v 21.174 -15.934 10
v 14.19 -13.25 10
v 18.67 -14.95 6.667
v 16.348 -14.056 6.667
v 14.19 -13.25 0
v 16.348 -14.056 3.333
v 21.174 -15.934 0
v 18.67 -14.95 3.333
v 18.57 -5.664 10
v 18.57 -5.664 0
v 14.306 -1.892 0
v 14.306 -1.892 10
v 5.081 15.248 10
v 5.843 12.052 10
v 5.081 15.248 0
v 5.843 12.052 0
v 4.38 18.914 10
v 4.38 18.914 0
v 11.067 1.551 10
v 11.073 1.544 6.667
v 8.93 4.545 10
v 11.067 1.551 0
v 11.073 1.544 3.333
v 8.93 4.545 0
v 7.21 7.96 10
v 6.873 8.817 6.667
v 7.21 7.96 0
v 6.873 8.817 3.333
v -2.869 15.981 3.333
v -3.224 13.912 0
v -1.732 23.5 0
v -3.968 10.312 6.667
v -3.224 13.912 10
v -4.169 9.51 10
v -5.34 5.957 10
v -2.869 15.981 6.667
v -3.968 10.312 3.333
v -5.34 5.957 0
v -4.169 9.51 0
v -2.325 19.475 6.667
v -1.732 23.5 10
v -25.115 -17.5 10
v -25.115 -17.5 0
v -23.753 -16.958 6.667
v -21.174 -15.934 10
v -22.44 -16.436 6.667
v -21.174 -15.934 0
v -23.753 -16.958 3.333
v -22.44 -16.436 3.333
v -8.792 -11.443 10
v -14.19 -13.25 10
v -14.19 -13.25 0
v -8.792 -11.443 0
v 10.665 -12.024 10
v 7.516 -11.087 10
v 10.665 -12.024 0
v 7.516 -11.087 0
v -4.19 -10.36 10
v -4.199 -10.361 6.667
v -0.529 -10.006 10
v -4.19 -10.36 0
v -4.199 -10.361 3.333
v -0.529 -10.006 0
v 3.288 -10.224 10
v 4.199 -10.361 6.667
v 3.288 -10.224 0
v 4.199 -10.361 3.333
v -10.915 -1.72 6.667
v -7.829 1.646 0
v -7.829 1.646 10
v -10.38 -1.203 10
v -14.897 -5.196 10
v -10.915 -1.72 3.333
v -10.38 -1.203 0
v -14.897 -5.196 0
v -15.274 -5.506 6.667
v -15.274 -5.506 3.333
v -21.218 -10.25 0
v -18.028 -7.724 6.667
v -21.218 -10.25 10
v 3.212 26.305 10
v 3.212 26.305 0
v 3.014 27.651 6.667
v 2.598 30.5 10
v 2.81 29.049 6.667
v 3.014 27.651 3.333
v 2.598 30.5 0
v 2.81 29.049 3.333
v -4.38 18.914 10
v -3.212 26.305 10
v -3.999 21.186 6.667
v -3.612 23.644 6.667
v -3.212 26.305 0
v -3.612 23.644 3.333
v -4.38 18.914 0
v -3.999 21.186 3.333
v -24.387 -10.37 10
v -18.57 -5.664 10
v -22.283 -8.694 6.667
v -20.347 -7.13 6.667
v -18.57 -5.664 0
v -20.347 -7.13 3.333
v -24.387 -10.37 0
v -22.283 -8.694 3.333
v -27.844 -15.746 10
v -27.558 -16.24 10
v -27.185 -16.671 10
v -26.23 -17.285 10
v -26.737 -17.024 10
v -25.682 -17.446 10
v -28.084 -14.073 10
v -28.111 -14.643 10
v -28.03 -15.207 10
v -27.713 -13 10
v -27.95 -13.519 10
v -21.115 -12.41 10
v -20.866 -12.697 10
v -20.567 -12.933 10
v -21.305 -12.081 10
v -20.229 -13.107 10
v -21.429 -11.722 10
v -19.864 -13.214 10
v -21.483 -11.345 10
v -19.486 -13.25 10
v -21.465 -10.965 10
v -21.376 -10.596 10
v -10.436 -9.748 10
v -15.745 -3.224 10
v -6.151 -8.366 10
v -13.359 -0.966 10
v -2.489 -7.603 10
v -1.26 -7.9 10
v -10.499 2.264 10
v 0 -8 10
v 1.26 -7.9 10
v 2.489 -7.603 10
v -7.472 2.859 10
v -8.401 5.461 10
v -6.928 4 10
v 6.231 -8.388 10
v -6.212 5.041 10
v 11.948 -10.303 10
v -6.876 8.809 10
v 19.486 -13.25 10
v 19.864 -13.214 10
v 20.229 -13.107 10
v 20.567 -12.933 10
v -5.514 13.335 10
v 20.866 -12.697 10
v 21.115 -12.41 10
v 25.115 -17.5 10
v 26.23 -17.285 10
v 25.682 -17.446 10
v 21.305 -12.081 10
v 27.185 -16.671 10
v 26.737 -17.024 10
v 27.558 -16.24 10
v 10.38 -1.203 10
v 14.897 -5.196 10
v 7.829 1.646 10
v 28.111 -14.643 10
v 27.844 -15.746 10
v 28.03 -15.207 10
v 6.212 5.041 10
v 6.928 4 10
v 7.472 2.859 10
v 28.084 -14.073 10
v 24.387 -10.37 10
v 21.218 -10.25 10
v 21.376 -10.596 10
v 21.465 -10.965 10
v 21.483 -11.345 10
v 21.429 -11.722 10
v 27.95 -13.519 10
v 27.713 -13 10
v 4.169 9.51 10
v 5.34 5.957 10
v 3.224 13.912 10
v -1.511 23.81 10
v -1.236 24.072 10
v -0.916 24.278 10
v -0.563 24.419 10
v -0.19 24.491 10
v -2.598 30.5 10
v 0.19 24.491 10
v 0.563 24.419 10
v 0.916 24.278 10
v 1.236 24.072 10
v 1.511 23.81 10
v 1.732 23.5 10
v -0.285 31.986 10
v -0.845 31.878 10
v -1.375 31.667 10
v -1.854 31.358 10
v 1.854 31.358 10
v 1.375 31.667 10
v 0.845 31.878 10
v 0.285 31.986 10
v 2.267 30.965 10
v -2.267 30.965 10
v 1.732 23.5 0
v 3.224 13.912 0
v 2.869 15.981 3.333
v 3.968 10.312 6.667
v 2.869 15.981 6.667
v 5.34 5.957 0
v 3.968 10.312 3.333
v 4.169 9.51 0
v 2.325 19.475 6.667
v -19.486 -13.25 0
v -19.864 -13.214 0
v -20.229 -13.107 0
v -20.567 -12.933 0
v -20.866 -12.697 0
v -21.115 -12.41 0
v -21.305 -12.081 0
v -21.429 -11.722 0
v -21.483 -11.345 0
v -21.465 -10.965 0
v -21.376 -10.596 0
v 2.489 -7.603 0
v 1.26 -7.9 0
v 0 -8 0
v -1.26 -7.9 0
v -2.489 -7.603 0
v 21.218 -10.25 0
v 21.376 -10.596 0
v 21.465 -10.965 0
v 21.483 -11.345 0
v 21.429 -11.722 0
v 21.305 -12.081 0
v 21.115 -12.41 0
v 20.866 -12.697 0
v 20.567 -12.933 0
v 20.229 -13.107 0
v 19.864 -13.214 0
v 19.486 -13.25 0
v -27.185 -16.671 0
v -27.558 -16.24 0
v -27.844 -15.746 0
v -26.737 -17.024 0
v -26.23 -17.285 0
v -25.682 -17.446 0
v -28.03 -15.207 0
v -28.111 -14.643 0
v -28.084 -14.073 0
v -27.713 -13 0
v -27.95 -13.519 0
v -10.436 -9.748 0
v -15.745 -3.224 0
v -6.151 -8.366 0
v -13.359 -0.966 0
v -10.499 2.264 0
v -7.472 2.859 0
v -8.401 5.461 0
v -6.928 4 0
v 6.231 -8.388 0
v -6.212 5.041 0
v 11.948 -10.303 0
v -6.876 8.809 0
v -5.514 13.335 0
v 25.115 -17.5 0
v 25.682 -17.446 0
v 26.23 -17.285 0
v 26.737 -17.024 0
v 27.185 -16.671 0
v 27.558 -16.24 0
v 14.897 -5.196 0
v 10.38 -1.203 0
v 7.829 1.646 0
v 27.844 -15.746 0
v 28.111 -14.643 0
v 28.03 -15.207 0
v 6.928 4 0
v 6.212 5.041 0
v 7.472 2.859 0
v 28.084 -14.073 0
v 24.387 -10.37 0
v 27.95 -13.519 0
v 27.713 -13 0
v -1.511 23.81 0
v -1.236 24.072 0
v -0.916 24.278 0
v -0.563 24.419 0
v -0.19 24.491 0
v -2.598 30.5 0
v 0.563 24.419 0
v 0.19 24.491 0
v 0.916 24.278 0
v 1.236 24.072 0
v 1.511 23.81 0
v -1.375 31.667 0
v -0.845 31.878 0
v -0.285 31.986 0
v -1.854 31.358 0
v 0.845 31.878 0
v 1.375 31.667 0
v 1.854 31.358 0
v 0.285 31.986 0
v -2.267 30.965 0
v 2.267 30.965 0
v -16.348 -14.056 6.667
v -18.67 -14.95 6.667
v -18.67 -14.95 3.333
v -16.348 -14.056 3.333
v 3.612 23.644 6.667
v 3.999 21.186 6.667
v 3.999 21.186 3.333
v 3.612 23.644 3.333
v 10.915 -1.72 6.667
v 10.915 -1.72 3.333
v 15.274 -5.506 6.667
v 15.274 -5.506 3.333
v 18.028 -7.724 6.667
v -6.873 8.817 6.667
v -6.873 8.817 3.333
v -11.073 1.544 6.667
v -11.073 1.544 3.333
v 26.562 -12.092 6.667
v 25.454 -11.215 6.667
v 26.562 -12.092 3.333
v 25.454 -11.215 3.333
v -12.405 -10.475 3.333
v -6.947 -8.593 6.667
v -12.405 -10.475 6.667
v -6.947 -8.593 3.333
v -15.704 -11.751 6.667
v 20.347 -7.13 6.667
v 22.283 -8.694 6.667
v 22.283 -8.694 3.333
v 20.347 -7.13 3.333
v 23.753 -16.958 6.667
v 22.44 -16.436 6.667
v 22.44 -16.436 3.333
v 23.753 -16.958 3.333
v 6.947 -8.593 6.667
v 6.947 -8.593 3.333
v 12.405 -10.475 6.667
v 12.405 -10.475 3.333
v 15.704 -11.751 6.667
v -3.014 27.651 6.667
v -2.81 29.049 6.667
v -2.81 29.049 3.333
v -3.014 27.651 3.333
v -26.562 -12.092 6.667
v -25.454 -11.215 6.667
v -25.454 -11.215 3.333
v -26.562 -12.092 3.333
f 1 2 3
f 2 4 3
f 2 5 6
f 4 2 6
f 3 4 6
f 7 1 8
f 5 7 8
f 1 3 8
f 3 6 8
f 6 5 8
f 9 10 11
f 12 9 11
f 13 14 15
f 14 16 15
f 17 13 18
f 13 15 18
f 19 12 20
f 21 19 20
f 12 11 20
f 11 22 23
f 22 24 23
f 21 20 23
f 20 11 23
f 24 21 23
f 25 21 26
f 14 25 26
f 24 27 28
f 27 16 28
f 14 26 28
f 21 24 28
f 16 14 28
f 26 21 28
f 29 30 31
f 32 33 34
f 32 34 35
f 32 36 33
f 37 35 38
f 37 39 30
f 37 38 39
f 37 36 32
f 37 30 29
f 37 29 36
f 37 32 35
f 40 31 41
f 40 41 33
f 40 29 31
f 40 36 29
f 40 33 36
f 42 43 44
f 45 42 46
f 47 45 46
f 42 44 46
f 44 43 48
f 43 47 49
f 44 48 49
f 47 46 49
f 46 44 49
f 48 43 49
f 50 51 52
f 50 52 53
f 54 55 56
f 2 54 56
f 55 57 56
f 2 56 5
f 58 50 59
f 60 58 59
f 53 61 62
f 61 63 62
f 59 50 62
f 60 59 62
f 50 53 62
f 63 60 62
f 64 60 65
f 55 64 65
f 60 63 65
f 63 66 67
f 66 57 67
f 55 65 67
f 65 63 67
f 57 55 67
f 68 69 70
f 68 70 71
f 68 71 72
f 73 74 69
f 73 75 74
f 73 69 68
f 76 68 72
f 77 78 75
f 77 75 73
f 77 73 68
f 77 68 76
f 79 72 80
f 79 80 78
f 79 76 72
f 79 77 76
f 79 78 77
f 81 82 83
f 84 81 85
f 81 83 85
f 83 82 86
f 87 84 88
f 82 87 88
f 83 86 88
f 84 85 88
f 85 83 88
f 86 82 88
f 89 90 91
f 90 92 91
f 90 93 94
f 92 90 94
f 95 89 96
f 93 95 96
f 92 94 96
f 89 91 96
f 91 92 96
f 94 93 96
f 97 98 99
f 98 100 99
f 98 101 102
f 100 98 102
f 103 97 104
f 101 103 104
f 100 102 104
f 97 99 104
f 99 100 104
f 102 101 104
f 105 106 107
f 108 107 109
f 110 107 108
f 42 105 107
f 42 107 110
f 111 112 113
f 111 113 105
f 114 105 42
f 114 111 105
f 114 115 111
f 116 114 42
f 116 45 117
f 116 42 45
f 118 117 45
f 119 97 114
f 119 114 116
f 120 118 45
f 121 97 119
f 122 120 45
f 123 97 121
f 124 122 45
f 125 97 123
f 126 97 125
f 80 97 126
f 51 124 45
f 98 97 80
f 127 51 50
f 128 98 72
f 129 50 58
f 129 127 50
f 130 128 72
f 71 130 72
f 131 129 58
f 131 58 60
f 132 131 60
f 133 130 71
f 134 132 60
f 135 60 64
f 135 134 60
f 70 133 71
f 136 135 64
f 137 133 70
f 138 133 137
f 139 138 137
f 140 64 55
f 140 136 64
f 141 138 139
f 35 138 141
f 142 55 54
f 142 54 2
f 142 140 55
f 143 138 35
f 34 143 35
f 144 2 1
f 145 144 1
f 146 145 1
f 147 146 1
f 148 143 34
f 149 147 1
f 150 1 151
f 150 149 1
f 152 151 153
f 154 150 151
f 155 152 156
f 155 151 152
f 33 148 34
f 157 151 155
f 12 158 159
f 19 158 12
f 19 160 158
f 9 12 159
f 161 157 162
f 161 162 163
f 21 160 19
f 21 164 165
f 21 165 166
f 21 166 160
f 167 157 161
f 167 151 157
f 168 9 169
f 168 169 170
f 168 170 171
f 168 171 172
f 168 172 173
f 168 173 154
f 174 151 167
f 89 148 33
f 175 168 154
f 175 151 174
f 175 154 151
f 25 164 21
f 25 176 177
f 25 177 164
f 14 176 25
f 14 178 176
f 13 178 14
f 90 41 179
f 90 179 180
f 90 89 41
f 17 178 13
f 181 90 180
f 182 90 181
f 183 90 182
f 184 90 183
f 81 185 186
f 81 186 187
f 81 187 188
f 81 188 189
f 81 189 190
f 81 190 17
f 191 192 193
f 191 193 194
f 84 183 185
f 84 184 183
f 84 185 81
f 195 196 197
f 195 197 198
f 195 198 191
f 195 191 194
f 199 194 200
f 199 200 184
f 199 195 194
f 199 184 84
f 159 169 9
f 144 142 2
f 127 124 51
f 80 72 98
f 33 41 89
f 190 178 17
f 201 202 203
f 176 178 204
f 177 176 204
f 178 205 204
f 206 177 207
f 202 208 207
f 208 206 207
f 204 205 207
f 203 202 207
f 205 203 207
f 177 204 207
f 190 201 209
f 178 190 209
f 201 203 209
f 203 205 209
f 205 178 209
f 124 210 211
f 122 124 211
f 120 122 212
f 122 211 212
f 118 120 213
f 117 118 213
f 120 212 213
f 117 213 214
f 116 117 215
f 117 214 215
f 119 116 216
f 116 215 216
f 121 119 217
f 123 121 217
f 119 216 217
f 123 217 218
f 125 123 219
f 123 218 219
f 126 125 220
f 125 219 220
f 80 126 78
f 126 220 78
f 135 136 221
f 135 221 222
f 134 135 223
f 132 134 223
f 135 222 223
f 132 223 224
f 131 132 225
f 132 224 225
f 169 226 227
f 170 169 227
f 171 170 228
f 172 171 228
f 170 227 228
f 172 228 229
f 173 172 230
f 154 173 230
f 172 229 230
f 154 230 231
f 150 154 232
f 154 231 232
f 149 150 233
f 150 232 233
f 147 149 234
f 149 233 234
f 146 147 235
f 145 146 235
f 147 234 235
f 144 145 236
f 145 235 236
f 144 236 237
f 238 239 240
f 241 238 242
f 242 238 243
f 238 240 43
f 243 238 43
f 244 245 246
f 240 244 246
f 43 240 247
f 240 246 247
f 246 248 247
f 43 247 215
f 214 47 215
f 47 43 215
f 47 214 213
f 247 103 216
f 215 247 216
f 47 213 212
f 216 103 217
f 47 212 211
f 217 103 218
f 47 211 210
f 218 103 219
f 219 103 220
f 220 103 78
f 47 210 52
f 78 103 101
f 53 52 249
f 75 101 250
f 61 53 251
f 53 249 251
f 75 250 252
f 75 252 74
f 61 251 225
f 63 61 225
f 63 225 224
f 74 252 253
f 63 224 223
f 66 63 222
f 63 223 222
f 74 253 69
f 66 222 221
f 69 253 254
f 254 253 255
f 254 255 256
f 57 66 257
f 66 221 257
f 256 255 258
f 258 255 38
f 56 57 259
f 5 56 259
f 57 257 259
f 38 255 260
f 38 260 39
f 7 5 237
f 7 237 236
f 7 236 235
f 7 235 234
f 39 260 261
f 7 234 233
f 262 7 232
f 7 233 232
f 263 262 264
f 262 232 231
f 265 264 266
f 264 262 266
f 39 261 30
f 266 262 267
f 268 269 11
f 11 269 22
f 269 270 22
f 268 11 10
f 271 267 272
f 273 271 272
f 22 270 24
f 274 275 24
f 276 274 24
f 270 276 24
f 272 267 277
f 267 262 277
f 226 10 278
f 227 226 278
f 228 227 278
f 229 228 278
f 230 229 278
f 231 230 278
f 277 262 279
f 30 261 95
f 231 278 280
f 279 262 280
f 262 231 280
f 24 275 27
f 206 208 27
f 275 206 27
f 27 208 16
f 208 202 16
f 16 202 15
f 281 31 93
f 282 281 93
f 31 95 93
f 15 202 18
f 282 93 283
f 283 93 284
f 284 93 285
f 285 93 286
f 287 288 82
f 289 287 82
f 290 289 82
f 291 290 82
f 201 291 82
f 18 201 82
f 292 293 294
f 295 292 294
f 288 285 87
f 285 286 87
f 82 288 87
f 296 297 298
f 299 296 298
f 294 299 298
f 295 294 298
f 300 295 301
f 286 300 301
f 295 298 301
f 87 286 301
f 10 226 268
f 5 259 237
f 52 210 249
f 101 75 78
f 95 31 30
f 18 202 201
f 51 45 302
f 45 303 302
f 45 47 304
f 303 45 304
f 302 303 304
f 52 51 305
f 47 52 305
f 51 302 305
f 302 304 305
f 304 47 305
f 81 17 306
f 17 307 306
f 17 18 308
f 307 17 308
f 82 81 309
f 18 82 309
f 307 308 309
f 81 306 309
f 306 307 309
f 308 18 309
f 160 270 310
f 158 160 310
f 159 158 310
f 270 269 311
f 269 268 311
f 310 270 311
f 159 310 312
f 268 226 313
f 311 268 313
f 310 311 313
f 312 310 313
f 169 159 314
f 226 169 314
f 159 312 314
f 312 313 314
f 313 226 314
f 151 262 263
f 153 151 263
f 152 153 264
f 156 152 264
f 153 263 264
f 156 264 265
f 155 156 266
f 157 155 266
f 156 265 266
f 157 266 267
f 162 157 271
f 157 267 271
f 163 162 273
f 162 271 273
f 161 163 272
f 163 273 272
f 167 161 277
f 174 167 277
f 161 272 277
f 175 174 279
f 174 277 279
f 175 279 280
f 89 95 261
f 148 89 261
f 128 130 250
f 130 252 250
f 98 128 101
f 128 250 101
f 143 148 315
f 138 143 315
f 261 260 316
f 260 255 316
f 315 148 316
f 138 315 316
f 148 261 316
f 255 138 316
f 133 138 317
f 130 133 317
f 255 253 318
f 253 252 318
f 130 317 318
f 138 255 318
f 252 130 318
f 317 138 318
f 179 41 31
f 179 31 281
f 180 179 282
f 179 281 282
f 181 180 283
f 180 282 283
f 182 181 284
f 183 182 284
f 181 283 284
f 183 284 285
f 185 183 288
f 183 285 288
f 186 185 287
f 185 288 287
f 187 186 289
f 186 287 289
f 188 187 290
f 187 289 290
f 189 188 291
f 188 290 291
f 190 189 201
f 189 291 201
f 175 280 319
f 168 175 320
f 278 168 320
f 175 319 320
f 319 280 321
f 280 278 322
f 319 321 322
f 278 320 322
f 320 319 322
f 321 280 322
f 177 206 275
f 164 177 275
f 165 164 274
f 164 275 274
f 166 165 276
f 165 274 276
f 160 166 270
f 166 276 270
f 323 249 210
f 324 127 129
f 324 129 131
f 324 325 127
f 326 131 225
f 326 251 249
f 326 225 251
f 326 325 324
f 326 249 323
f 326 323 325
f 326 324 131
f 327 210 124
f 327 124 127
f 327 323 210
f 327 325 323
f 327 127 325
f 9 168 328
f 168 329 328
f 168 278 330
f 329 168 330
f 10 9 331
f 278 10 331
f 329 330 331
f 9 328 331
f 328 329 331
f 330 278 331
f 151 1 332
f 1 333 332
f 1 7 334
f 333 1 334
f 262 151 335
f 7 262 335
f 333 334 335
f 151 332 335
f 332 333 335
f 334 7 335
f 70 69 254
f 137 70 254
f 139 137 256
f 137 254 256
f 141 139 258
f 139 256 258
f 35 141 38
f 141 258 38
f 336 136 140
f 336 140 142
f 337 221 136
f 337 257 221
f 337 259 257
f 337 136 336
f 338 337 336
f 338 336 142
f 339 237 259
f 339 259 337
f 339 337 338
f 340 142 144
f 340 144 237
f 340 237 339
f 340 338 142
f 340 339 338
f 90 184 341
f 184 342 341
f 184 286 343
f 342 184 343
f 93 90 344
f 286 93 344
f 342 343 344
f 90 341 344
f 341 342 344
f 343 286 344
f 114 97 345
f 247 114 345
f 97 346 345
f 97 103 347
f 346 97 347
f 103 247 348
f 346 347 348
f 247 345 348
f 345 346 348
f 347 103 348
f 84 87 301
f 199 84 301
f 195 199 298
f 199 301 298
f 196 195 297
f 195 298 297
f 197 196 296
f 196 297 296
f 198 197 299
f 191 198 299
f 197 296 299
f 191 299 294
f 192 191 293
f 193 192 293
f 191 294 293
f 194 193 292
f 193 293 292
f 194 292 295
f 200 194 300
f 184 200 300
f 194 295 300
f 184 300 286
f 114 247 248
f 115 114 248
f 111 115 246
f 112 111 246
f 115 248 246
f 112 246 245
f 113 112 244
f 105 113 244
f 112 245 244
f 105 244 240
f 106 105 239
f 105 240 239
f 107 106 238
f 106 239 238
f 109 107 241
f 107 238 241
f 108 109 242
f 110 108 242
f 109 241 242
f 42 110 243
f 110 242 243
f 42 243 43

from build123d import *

# Parameters (mm, degrees)
F1_DEPTH = 10


# Not quite as in the source:
# - a feature of the source that left no trace in its solid (it failed there, or was rolled back) is left out


with BuildPart() as f1:
    # F0 (on Top) → F1 (new body)
    with BuildSketch(Plane.XY):
        with BuildLine():
            ThreePointArc((5.3398427629, 5.9570193274), (6.9282032303, 4), (7.8288514498, 1.6459298212))
            add(Edge.make_bspline(
                [(7.8288514498, 1.6459298212), (10.3819017266, -1.689149351), (14.3784307752, -4.8466401497), (21.2176223927, -10.25)],
                knots=[22.7730577605, 22.7730577605, 22.7730577605, 22.7730577605, 38.9711431703, 38.9711431703, 38.9711431703, 38.9711431703], degree=3))
            Line((21.2176223927, -10.25), (18.5700532559, -5.6642757385))
            add(Edge.make_bspline(
                [(18.5700532559, -5.6642757385), (8.8931150266, 2.4300062697), (6.5510046742, 6.486660397), (4.3796199444, 18.9142757385)],
                knots=[8.5821930458, 8.5821930458, 8.5821930458, 8.5821930458, 41.6472803737, 41.6472803737, 41.6472803737, 41.6472803737], degree=3))
            Line((4.3796199444, 18.9142757385), (1.7320508076, 23.5))
            add(Edge.make_bspline(
                [(1.7320508076, 23.5), (2.991901895, 14.8754063927), (3.7281046145, 9.8355653103), (5.3398427629, 5.9570193274)],
                knots=[0, 0, 0, 0, 16.1980854098, 16.1980854098, 16.1980854098, 16.1980854098], degree=3))
        make_face()
        with BuildLine():
            add(Edge.make_bspline(
                [(2.4890086869, -7.6029491486), (6.6537971121, -8.1464159593), (11.3865288802, -10.0287662431), (19.4855715851, -13.25)],
                knots=[22.7730577605, 22.7730577605, 22.7730577605, 22.7730577605, 38.9711431703, 38.9711431703, 38.9711431703, 38.9711431703], degree=3))
            ThreePointArc((2.4890086869, -7.6029491486), (0, -8), (-2.4890086869, -7.6029491486))
            add(Edge.make_bspline(
                [(-19.4855715852, -13.25), (-11.3865288802, -10.0287662431), (-6.6537971121, -8.1464159593), (-2.4890086869, -7.6029491486)],
                knots=[0, 0, 0, 0, 16.1980854098, 16.1980854098, 16.1980854098, 16.1980854098], degree=3))
            Line((-19.4855715852, -13.25), (-14.1904333115, -13.25))
            add(Edge.make_bspline(
                [(-14.1904333115, -13.25), (-2.3421103524, -8.9166666667), (2.3421103524, -8.9166666667), (14.1904333115, -13.25)],
                knots=[8.5821930458, 8.5821930458, 8.5821930458, 8.5821930458, 41.6472803737, 41.6472803737, 41.6472803737, 41.6472803737], degree=3))
            Line((14.1904333115, -13.25), (19.4855715851, -13.25))
        make_face()
        with BuildLine():
            Line((18.5700532559, -5.6642757385), (21.2176223927, -10.25))
            ThreePointArc((21.2176223927, -10.25), (21.2176223927, -12.25), (19.4855715851, -13.25))
            Line((19.4855715851, -13.25), (14.1904333115, -13.25))
            add(Edge.make_bspline(
                [(14.1904333115, -13.25), (16.2714670553, -14.0111045817), (18.573507913, -14.9058892059), (21.174191051, -15.9343538726)],
                knots=[41.6472803737, 41.6472803737, 41.6472803737, 41.6472803737, 47.4548164026, 47.4548164026, 47.4548164026, 47.4548164026], degree=3))
            ThreePointArc((21.174191051, -15.9343538726), (22.9496732003, -13.25), (24.386650772, -10.3702104184))
            add(Edge.make_bspline(
                [(24.386650772, -10.3702104184), (22.1956326748, -8.6321850871), (20.2697060304, -7.0859515359), (18.5700532559, -5.6642757385)],
                knots=[2.7746570169, 2.7746570169, 2.7746570169, 2.7746570169, 8.5821930458, 8.5821930458, 8.5821930458, 8.5821930458], degree=3))
        make_face()
        with BuildLine():
            ThreePointArc((-7.8288514498, 1.6459298212), (-6.9282032303, 4), (-5.3398427629, 5.9570193274))
            add(Edge.make_bspline(
                [(-1.7320508076, 23.5), (-2.991901895, 14.8754063927), (-3.7281046145, 9.8355653103), (-5.3398427629, 5.9570193274)],
                knots=[0, 0, 0, 0, 16.1980854098, 16.1980854098, 16.1980854098, 16.1980854098], degree=3))
            Line((-1.7320508076, 23.5), (-4.3796199444, 18.9142757385))
            add(Edge.make_bspline(
                [(-4.3796199444, 18.9142757385), (-6.5510046742, 6.486660397), (-8.8931150266, 2.4300062697), (-18.5700532559, -5.6642757385)],
                knots=[8.5821930458, 8.5821930458, 8.5821930458, 8.5821930458, 41.6472803737, 41.6472803737, 41.6472803737, 41.6472803737], degree=3))
            Line((-18.5700532559, -5.6642757385), (-21.2176223927, -10.25))
            add(Edge.make_bspline(
                [(-7.8288514498, 1.6459298212), (-10.3819017266, -1.689149351), (-14.3784307752, -4.8466401497), (-21.2176223927, -10.25)],
                knots=[22.7730577605, 22.7730577605, 22.7730577605, 22.7730577605, 38.9711431703, 38.9711431703, 38.9711431703, 38.9711431703], degree=3))
        make_face()
        with BuildLine():
            ThreePointArc((-1.7320508076, 23.5), (0, 24.5), (1.7320508076, 23.5))
            Line((1.7320508076, 23.5), (4.3796199444, 18.9142757385))
            add(Edge.make_bspline(
                [(4.3796199444, 18.9142757385), (3.9982389752, 21.0970561175), (3.6221247618, 23.5380742929), (3.2124597211, 26.304564291)],
                knots=[41.6472803737, 41.6472803737, 41.6472803737, 41.6472803737, 47.4548164026, 47.4548164026, 47.4548164026, 47.4548164026], degree=3))
            ThreePointArc((3.2124597211, 26.304564291), (0, 26.5), (-3.2124597211, 26.304564291))
            add(Edge.make_bspline(
                [(-3.2124597211, 26.304564291), (-3.6221247618, 23.5380742929), (-3.9982389752, 21.0970561175), (-4.3796199444, 18.9142757385)],
                knots=[2.7746570169, 2.7746570169, 2.7746570169, 2.7746570169, 8.5821930458, 8.5821930458, 8.5821930458, 8.5821930458], degree=3))
            Line((-4.3796199444, 18.9142757385), (-1.7320508076, 23.5))
        make_face()
        with BuildLine():
            Line((-14.1904333115, -13.25), (-19.4855715852, -13.25))
            ThreePointArc((-19.4855715852, -13.25), (-21.2176223927, -12.25), (-21.2176223927, -10.25))
            Line((-21.2176223927, -10.25), (-18.5700532559, -5.6642757385))
            add(Edge.make_bspline(
                [(-18.5700532559, -5.6642757385), (-20.2697060304, -7.0859515359), (-22.1956326748, -8.6321850871), (-24.386650772, -10.3702104184)],
                knots=[41.6472803737, 41.6472803737, 41.6472803737, 41.6472803737, 47.4548164026, 47.4548164026, 47.4548164026, 47.4548164026], degree=3))
            ThreePointArc((-24.386650772, -10.3702104184), (-22.9496732003, -13.25), (-21.174191051, -15.9343538726))
            add(Edge.make_bspline(
                [(-21.174191051, -15.9343538726), (-18.573507913, -14.9058892059), (-16.2714670553, -14.0111045817), (-14.1904333115, -13.25)],
                knots=[2.7746570169, 2.7746570169, 2.7746570169, 2.7746570169, 8.5821930458, 8.5821930458, 8.5821930458, 8.5821930458], degree=3))
        make_face()
        with BuildLine():
            add(Edge.make_bspline(
                [(27.7128129211, -13), (26.540759526, -12.0747363675), (25.433449915, -11.2005839464), (24.386650772, -10.3702104184)],
                knots=[0, 0, 0, 0, 2.7746570169, 2.7746570169, 2.7746570169, 2.7746570169], degree=3))
            ThreePointArc((24.386650772, -10.3702104184), (22.9496732003, -13.25), (21.174191051, -15.9343538726))
            add(Edge.make_bspline(
                [(21.174191051, -15.9343538726), (22.4167151923, -16.425721759), (23.7274082013, -16.9476038015), (25.1147367097, -17.5)],
                knots=[47.4548164026, 47.4548164026, 47.4548164026, 47.4548164026, 50.2294734195, 50.2294734195, 50.2294734195, 50.2294734195], degree=3))
            ThreePointArc((25.1147367097, -17.5), (27.7128129211, -16), (27.7128129211, -13))
        make_face()
        with BuildLine():
            ThreePointArc((-3.2124597211, 26.304564291), (0, 26.5), (3.2124597211, 26.304564291))
            add(Edge.make_bspline(
                [(3.2124597211, 26.304564291), (3.0167347227, 27.6263057055), (2.8133513247, 29.0223401691), (2.5980762114, 30.5)],
                knots=[47.4548164026, 47.4548164026, 47.4548164026, 47.4548164026, 50.2294734195, 50.2294734195, 50.2294734195, 50.2294734195], degree=3))
            ThreePointArc((2.5980762114, 30.5), (0, 32), (-2.5980762114, 30.5))
            add(Edge.make_bspline(
                [(-2.5980762114, 30.5), (-2.8133513247, 29.0223401691), (-3.0167347227, 27.6263057055), (-3.2124597211, 26.304564291)],
                knots=[0, 0, 0, 0, 2.7746570169, 2.7746570169, 2.7746570169, 2.7746570169], degree=3))
        make_face()
        with BuildLine():
            add(Edge.make_bspline(
                [(-25.1147367097, -17.5), (-23.7274082013, -16.9476038015), (-22.4167151923, -16.425721759), (-21.174191051, -15.9343538726)],
                knots=[0, 0, 0, 0, 2.7746570169, 2.7746570169, 2.7746570169, 2.7746570169], degree=3))
            ThreePointArc((-21.174191051, -15.9343538726), (-22.9496732003, -13.25), (-24.386650772, -10.3702104184))
            add(Edge.make_bspline(
                [(-24.386650772, -10.3702104184), (-25.433449915, -11.2005839464), (-26.540759526, -12.0747363675), (-27.7128129211, -13)],
                knots=[47.4548164026, 47.4548164026, 47.4548164026, 47.4548164026, 50.2294734195, 50.2294734195, 50.2294734195, 50.2294734195], degree=3))
            ThreePointArc((-27.7128129211, -13), (-27.7128129211, -16), (-25.1147367097, -17.5))
        make_face()
    extrude(amount=F1_DEPTH)


solid = f1.part
